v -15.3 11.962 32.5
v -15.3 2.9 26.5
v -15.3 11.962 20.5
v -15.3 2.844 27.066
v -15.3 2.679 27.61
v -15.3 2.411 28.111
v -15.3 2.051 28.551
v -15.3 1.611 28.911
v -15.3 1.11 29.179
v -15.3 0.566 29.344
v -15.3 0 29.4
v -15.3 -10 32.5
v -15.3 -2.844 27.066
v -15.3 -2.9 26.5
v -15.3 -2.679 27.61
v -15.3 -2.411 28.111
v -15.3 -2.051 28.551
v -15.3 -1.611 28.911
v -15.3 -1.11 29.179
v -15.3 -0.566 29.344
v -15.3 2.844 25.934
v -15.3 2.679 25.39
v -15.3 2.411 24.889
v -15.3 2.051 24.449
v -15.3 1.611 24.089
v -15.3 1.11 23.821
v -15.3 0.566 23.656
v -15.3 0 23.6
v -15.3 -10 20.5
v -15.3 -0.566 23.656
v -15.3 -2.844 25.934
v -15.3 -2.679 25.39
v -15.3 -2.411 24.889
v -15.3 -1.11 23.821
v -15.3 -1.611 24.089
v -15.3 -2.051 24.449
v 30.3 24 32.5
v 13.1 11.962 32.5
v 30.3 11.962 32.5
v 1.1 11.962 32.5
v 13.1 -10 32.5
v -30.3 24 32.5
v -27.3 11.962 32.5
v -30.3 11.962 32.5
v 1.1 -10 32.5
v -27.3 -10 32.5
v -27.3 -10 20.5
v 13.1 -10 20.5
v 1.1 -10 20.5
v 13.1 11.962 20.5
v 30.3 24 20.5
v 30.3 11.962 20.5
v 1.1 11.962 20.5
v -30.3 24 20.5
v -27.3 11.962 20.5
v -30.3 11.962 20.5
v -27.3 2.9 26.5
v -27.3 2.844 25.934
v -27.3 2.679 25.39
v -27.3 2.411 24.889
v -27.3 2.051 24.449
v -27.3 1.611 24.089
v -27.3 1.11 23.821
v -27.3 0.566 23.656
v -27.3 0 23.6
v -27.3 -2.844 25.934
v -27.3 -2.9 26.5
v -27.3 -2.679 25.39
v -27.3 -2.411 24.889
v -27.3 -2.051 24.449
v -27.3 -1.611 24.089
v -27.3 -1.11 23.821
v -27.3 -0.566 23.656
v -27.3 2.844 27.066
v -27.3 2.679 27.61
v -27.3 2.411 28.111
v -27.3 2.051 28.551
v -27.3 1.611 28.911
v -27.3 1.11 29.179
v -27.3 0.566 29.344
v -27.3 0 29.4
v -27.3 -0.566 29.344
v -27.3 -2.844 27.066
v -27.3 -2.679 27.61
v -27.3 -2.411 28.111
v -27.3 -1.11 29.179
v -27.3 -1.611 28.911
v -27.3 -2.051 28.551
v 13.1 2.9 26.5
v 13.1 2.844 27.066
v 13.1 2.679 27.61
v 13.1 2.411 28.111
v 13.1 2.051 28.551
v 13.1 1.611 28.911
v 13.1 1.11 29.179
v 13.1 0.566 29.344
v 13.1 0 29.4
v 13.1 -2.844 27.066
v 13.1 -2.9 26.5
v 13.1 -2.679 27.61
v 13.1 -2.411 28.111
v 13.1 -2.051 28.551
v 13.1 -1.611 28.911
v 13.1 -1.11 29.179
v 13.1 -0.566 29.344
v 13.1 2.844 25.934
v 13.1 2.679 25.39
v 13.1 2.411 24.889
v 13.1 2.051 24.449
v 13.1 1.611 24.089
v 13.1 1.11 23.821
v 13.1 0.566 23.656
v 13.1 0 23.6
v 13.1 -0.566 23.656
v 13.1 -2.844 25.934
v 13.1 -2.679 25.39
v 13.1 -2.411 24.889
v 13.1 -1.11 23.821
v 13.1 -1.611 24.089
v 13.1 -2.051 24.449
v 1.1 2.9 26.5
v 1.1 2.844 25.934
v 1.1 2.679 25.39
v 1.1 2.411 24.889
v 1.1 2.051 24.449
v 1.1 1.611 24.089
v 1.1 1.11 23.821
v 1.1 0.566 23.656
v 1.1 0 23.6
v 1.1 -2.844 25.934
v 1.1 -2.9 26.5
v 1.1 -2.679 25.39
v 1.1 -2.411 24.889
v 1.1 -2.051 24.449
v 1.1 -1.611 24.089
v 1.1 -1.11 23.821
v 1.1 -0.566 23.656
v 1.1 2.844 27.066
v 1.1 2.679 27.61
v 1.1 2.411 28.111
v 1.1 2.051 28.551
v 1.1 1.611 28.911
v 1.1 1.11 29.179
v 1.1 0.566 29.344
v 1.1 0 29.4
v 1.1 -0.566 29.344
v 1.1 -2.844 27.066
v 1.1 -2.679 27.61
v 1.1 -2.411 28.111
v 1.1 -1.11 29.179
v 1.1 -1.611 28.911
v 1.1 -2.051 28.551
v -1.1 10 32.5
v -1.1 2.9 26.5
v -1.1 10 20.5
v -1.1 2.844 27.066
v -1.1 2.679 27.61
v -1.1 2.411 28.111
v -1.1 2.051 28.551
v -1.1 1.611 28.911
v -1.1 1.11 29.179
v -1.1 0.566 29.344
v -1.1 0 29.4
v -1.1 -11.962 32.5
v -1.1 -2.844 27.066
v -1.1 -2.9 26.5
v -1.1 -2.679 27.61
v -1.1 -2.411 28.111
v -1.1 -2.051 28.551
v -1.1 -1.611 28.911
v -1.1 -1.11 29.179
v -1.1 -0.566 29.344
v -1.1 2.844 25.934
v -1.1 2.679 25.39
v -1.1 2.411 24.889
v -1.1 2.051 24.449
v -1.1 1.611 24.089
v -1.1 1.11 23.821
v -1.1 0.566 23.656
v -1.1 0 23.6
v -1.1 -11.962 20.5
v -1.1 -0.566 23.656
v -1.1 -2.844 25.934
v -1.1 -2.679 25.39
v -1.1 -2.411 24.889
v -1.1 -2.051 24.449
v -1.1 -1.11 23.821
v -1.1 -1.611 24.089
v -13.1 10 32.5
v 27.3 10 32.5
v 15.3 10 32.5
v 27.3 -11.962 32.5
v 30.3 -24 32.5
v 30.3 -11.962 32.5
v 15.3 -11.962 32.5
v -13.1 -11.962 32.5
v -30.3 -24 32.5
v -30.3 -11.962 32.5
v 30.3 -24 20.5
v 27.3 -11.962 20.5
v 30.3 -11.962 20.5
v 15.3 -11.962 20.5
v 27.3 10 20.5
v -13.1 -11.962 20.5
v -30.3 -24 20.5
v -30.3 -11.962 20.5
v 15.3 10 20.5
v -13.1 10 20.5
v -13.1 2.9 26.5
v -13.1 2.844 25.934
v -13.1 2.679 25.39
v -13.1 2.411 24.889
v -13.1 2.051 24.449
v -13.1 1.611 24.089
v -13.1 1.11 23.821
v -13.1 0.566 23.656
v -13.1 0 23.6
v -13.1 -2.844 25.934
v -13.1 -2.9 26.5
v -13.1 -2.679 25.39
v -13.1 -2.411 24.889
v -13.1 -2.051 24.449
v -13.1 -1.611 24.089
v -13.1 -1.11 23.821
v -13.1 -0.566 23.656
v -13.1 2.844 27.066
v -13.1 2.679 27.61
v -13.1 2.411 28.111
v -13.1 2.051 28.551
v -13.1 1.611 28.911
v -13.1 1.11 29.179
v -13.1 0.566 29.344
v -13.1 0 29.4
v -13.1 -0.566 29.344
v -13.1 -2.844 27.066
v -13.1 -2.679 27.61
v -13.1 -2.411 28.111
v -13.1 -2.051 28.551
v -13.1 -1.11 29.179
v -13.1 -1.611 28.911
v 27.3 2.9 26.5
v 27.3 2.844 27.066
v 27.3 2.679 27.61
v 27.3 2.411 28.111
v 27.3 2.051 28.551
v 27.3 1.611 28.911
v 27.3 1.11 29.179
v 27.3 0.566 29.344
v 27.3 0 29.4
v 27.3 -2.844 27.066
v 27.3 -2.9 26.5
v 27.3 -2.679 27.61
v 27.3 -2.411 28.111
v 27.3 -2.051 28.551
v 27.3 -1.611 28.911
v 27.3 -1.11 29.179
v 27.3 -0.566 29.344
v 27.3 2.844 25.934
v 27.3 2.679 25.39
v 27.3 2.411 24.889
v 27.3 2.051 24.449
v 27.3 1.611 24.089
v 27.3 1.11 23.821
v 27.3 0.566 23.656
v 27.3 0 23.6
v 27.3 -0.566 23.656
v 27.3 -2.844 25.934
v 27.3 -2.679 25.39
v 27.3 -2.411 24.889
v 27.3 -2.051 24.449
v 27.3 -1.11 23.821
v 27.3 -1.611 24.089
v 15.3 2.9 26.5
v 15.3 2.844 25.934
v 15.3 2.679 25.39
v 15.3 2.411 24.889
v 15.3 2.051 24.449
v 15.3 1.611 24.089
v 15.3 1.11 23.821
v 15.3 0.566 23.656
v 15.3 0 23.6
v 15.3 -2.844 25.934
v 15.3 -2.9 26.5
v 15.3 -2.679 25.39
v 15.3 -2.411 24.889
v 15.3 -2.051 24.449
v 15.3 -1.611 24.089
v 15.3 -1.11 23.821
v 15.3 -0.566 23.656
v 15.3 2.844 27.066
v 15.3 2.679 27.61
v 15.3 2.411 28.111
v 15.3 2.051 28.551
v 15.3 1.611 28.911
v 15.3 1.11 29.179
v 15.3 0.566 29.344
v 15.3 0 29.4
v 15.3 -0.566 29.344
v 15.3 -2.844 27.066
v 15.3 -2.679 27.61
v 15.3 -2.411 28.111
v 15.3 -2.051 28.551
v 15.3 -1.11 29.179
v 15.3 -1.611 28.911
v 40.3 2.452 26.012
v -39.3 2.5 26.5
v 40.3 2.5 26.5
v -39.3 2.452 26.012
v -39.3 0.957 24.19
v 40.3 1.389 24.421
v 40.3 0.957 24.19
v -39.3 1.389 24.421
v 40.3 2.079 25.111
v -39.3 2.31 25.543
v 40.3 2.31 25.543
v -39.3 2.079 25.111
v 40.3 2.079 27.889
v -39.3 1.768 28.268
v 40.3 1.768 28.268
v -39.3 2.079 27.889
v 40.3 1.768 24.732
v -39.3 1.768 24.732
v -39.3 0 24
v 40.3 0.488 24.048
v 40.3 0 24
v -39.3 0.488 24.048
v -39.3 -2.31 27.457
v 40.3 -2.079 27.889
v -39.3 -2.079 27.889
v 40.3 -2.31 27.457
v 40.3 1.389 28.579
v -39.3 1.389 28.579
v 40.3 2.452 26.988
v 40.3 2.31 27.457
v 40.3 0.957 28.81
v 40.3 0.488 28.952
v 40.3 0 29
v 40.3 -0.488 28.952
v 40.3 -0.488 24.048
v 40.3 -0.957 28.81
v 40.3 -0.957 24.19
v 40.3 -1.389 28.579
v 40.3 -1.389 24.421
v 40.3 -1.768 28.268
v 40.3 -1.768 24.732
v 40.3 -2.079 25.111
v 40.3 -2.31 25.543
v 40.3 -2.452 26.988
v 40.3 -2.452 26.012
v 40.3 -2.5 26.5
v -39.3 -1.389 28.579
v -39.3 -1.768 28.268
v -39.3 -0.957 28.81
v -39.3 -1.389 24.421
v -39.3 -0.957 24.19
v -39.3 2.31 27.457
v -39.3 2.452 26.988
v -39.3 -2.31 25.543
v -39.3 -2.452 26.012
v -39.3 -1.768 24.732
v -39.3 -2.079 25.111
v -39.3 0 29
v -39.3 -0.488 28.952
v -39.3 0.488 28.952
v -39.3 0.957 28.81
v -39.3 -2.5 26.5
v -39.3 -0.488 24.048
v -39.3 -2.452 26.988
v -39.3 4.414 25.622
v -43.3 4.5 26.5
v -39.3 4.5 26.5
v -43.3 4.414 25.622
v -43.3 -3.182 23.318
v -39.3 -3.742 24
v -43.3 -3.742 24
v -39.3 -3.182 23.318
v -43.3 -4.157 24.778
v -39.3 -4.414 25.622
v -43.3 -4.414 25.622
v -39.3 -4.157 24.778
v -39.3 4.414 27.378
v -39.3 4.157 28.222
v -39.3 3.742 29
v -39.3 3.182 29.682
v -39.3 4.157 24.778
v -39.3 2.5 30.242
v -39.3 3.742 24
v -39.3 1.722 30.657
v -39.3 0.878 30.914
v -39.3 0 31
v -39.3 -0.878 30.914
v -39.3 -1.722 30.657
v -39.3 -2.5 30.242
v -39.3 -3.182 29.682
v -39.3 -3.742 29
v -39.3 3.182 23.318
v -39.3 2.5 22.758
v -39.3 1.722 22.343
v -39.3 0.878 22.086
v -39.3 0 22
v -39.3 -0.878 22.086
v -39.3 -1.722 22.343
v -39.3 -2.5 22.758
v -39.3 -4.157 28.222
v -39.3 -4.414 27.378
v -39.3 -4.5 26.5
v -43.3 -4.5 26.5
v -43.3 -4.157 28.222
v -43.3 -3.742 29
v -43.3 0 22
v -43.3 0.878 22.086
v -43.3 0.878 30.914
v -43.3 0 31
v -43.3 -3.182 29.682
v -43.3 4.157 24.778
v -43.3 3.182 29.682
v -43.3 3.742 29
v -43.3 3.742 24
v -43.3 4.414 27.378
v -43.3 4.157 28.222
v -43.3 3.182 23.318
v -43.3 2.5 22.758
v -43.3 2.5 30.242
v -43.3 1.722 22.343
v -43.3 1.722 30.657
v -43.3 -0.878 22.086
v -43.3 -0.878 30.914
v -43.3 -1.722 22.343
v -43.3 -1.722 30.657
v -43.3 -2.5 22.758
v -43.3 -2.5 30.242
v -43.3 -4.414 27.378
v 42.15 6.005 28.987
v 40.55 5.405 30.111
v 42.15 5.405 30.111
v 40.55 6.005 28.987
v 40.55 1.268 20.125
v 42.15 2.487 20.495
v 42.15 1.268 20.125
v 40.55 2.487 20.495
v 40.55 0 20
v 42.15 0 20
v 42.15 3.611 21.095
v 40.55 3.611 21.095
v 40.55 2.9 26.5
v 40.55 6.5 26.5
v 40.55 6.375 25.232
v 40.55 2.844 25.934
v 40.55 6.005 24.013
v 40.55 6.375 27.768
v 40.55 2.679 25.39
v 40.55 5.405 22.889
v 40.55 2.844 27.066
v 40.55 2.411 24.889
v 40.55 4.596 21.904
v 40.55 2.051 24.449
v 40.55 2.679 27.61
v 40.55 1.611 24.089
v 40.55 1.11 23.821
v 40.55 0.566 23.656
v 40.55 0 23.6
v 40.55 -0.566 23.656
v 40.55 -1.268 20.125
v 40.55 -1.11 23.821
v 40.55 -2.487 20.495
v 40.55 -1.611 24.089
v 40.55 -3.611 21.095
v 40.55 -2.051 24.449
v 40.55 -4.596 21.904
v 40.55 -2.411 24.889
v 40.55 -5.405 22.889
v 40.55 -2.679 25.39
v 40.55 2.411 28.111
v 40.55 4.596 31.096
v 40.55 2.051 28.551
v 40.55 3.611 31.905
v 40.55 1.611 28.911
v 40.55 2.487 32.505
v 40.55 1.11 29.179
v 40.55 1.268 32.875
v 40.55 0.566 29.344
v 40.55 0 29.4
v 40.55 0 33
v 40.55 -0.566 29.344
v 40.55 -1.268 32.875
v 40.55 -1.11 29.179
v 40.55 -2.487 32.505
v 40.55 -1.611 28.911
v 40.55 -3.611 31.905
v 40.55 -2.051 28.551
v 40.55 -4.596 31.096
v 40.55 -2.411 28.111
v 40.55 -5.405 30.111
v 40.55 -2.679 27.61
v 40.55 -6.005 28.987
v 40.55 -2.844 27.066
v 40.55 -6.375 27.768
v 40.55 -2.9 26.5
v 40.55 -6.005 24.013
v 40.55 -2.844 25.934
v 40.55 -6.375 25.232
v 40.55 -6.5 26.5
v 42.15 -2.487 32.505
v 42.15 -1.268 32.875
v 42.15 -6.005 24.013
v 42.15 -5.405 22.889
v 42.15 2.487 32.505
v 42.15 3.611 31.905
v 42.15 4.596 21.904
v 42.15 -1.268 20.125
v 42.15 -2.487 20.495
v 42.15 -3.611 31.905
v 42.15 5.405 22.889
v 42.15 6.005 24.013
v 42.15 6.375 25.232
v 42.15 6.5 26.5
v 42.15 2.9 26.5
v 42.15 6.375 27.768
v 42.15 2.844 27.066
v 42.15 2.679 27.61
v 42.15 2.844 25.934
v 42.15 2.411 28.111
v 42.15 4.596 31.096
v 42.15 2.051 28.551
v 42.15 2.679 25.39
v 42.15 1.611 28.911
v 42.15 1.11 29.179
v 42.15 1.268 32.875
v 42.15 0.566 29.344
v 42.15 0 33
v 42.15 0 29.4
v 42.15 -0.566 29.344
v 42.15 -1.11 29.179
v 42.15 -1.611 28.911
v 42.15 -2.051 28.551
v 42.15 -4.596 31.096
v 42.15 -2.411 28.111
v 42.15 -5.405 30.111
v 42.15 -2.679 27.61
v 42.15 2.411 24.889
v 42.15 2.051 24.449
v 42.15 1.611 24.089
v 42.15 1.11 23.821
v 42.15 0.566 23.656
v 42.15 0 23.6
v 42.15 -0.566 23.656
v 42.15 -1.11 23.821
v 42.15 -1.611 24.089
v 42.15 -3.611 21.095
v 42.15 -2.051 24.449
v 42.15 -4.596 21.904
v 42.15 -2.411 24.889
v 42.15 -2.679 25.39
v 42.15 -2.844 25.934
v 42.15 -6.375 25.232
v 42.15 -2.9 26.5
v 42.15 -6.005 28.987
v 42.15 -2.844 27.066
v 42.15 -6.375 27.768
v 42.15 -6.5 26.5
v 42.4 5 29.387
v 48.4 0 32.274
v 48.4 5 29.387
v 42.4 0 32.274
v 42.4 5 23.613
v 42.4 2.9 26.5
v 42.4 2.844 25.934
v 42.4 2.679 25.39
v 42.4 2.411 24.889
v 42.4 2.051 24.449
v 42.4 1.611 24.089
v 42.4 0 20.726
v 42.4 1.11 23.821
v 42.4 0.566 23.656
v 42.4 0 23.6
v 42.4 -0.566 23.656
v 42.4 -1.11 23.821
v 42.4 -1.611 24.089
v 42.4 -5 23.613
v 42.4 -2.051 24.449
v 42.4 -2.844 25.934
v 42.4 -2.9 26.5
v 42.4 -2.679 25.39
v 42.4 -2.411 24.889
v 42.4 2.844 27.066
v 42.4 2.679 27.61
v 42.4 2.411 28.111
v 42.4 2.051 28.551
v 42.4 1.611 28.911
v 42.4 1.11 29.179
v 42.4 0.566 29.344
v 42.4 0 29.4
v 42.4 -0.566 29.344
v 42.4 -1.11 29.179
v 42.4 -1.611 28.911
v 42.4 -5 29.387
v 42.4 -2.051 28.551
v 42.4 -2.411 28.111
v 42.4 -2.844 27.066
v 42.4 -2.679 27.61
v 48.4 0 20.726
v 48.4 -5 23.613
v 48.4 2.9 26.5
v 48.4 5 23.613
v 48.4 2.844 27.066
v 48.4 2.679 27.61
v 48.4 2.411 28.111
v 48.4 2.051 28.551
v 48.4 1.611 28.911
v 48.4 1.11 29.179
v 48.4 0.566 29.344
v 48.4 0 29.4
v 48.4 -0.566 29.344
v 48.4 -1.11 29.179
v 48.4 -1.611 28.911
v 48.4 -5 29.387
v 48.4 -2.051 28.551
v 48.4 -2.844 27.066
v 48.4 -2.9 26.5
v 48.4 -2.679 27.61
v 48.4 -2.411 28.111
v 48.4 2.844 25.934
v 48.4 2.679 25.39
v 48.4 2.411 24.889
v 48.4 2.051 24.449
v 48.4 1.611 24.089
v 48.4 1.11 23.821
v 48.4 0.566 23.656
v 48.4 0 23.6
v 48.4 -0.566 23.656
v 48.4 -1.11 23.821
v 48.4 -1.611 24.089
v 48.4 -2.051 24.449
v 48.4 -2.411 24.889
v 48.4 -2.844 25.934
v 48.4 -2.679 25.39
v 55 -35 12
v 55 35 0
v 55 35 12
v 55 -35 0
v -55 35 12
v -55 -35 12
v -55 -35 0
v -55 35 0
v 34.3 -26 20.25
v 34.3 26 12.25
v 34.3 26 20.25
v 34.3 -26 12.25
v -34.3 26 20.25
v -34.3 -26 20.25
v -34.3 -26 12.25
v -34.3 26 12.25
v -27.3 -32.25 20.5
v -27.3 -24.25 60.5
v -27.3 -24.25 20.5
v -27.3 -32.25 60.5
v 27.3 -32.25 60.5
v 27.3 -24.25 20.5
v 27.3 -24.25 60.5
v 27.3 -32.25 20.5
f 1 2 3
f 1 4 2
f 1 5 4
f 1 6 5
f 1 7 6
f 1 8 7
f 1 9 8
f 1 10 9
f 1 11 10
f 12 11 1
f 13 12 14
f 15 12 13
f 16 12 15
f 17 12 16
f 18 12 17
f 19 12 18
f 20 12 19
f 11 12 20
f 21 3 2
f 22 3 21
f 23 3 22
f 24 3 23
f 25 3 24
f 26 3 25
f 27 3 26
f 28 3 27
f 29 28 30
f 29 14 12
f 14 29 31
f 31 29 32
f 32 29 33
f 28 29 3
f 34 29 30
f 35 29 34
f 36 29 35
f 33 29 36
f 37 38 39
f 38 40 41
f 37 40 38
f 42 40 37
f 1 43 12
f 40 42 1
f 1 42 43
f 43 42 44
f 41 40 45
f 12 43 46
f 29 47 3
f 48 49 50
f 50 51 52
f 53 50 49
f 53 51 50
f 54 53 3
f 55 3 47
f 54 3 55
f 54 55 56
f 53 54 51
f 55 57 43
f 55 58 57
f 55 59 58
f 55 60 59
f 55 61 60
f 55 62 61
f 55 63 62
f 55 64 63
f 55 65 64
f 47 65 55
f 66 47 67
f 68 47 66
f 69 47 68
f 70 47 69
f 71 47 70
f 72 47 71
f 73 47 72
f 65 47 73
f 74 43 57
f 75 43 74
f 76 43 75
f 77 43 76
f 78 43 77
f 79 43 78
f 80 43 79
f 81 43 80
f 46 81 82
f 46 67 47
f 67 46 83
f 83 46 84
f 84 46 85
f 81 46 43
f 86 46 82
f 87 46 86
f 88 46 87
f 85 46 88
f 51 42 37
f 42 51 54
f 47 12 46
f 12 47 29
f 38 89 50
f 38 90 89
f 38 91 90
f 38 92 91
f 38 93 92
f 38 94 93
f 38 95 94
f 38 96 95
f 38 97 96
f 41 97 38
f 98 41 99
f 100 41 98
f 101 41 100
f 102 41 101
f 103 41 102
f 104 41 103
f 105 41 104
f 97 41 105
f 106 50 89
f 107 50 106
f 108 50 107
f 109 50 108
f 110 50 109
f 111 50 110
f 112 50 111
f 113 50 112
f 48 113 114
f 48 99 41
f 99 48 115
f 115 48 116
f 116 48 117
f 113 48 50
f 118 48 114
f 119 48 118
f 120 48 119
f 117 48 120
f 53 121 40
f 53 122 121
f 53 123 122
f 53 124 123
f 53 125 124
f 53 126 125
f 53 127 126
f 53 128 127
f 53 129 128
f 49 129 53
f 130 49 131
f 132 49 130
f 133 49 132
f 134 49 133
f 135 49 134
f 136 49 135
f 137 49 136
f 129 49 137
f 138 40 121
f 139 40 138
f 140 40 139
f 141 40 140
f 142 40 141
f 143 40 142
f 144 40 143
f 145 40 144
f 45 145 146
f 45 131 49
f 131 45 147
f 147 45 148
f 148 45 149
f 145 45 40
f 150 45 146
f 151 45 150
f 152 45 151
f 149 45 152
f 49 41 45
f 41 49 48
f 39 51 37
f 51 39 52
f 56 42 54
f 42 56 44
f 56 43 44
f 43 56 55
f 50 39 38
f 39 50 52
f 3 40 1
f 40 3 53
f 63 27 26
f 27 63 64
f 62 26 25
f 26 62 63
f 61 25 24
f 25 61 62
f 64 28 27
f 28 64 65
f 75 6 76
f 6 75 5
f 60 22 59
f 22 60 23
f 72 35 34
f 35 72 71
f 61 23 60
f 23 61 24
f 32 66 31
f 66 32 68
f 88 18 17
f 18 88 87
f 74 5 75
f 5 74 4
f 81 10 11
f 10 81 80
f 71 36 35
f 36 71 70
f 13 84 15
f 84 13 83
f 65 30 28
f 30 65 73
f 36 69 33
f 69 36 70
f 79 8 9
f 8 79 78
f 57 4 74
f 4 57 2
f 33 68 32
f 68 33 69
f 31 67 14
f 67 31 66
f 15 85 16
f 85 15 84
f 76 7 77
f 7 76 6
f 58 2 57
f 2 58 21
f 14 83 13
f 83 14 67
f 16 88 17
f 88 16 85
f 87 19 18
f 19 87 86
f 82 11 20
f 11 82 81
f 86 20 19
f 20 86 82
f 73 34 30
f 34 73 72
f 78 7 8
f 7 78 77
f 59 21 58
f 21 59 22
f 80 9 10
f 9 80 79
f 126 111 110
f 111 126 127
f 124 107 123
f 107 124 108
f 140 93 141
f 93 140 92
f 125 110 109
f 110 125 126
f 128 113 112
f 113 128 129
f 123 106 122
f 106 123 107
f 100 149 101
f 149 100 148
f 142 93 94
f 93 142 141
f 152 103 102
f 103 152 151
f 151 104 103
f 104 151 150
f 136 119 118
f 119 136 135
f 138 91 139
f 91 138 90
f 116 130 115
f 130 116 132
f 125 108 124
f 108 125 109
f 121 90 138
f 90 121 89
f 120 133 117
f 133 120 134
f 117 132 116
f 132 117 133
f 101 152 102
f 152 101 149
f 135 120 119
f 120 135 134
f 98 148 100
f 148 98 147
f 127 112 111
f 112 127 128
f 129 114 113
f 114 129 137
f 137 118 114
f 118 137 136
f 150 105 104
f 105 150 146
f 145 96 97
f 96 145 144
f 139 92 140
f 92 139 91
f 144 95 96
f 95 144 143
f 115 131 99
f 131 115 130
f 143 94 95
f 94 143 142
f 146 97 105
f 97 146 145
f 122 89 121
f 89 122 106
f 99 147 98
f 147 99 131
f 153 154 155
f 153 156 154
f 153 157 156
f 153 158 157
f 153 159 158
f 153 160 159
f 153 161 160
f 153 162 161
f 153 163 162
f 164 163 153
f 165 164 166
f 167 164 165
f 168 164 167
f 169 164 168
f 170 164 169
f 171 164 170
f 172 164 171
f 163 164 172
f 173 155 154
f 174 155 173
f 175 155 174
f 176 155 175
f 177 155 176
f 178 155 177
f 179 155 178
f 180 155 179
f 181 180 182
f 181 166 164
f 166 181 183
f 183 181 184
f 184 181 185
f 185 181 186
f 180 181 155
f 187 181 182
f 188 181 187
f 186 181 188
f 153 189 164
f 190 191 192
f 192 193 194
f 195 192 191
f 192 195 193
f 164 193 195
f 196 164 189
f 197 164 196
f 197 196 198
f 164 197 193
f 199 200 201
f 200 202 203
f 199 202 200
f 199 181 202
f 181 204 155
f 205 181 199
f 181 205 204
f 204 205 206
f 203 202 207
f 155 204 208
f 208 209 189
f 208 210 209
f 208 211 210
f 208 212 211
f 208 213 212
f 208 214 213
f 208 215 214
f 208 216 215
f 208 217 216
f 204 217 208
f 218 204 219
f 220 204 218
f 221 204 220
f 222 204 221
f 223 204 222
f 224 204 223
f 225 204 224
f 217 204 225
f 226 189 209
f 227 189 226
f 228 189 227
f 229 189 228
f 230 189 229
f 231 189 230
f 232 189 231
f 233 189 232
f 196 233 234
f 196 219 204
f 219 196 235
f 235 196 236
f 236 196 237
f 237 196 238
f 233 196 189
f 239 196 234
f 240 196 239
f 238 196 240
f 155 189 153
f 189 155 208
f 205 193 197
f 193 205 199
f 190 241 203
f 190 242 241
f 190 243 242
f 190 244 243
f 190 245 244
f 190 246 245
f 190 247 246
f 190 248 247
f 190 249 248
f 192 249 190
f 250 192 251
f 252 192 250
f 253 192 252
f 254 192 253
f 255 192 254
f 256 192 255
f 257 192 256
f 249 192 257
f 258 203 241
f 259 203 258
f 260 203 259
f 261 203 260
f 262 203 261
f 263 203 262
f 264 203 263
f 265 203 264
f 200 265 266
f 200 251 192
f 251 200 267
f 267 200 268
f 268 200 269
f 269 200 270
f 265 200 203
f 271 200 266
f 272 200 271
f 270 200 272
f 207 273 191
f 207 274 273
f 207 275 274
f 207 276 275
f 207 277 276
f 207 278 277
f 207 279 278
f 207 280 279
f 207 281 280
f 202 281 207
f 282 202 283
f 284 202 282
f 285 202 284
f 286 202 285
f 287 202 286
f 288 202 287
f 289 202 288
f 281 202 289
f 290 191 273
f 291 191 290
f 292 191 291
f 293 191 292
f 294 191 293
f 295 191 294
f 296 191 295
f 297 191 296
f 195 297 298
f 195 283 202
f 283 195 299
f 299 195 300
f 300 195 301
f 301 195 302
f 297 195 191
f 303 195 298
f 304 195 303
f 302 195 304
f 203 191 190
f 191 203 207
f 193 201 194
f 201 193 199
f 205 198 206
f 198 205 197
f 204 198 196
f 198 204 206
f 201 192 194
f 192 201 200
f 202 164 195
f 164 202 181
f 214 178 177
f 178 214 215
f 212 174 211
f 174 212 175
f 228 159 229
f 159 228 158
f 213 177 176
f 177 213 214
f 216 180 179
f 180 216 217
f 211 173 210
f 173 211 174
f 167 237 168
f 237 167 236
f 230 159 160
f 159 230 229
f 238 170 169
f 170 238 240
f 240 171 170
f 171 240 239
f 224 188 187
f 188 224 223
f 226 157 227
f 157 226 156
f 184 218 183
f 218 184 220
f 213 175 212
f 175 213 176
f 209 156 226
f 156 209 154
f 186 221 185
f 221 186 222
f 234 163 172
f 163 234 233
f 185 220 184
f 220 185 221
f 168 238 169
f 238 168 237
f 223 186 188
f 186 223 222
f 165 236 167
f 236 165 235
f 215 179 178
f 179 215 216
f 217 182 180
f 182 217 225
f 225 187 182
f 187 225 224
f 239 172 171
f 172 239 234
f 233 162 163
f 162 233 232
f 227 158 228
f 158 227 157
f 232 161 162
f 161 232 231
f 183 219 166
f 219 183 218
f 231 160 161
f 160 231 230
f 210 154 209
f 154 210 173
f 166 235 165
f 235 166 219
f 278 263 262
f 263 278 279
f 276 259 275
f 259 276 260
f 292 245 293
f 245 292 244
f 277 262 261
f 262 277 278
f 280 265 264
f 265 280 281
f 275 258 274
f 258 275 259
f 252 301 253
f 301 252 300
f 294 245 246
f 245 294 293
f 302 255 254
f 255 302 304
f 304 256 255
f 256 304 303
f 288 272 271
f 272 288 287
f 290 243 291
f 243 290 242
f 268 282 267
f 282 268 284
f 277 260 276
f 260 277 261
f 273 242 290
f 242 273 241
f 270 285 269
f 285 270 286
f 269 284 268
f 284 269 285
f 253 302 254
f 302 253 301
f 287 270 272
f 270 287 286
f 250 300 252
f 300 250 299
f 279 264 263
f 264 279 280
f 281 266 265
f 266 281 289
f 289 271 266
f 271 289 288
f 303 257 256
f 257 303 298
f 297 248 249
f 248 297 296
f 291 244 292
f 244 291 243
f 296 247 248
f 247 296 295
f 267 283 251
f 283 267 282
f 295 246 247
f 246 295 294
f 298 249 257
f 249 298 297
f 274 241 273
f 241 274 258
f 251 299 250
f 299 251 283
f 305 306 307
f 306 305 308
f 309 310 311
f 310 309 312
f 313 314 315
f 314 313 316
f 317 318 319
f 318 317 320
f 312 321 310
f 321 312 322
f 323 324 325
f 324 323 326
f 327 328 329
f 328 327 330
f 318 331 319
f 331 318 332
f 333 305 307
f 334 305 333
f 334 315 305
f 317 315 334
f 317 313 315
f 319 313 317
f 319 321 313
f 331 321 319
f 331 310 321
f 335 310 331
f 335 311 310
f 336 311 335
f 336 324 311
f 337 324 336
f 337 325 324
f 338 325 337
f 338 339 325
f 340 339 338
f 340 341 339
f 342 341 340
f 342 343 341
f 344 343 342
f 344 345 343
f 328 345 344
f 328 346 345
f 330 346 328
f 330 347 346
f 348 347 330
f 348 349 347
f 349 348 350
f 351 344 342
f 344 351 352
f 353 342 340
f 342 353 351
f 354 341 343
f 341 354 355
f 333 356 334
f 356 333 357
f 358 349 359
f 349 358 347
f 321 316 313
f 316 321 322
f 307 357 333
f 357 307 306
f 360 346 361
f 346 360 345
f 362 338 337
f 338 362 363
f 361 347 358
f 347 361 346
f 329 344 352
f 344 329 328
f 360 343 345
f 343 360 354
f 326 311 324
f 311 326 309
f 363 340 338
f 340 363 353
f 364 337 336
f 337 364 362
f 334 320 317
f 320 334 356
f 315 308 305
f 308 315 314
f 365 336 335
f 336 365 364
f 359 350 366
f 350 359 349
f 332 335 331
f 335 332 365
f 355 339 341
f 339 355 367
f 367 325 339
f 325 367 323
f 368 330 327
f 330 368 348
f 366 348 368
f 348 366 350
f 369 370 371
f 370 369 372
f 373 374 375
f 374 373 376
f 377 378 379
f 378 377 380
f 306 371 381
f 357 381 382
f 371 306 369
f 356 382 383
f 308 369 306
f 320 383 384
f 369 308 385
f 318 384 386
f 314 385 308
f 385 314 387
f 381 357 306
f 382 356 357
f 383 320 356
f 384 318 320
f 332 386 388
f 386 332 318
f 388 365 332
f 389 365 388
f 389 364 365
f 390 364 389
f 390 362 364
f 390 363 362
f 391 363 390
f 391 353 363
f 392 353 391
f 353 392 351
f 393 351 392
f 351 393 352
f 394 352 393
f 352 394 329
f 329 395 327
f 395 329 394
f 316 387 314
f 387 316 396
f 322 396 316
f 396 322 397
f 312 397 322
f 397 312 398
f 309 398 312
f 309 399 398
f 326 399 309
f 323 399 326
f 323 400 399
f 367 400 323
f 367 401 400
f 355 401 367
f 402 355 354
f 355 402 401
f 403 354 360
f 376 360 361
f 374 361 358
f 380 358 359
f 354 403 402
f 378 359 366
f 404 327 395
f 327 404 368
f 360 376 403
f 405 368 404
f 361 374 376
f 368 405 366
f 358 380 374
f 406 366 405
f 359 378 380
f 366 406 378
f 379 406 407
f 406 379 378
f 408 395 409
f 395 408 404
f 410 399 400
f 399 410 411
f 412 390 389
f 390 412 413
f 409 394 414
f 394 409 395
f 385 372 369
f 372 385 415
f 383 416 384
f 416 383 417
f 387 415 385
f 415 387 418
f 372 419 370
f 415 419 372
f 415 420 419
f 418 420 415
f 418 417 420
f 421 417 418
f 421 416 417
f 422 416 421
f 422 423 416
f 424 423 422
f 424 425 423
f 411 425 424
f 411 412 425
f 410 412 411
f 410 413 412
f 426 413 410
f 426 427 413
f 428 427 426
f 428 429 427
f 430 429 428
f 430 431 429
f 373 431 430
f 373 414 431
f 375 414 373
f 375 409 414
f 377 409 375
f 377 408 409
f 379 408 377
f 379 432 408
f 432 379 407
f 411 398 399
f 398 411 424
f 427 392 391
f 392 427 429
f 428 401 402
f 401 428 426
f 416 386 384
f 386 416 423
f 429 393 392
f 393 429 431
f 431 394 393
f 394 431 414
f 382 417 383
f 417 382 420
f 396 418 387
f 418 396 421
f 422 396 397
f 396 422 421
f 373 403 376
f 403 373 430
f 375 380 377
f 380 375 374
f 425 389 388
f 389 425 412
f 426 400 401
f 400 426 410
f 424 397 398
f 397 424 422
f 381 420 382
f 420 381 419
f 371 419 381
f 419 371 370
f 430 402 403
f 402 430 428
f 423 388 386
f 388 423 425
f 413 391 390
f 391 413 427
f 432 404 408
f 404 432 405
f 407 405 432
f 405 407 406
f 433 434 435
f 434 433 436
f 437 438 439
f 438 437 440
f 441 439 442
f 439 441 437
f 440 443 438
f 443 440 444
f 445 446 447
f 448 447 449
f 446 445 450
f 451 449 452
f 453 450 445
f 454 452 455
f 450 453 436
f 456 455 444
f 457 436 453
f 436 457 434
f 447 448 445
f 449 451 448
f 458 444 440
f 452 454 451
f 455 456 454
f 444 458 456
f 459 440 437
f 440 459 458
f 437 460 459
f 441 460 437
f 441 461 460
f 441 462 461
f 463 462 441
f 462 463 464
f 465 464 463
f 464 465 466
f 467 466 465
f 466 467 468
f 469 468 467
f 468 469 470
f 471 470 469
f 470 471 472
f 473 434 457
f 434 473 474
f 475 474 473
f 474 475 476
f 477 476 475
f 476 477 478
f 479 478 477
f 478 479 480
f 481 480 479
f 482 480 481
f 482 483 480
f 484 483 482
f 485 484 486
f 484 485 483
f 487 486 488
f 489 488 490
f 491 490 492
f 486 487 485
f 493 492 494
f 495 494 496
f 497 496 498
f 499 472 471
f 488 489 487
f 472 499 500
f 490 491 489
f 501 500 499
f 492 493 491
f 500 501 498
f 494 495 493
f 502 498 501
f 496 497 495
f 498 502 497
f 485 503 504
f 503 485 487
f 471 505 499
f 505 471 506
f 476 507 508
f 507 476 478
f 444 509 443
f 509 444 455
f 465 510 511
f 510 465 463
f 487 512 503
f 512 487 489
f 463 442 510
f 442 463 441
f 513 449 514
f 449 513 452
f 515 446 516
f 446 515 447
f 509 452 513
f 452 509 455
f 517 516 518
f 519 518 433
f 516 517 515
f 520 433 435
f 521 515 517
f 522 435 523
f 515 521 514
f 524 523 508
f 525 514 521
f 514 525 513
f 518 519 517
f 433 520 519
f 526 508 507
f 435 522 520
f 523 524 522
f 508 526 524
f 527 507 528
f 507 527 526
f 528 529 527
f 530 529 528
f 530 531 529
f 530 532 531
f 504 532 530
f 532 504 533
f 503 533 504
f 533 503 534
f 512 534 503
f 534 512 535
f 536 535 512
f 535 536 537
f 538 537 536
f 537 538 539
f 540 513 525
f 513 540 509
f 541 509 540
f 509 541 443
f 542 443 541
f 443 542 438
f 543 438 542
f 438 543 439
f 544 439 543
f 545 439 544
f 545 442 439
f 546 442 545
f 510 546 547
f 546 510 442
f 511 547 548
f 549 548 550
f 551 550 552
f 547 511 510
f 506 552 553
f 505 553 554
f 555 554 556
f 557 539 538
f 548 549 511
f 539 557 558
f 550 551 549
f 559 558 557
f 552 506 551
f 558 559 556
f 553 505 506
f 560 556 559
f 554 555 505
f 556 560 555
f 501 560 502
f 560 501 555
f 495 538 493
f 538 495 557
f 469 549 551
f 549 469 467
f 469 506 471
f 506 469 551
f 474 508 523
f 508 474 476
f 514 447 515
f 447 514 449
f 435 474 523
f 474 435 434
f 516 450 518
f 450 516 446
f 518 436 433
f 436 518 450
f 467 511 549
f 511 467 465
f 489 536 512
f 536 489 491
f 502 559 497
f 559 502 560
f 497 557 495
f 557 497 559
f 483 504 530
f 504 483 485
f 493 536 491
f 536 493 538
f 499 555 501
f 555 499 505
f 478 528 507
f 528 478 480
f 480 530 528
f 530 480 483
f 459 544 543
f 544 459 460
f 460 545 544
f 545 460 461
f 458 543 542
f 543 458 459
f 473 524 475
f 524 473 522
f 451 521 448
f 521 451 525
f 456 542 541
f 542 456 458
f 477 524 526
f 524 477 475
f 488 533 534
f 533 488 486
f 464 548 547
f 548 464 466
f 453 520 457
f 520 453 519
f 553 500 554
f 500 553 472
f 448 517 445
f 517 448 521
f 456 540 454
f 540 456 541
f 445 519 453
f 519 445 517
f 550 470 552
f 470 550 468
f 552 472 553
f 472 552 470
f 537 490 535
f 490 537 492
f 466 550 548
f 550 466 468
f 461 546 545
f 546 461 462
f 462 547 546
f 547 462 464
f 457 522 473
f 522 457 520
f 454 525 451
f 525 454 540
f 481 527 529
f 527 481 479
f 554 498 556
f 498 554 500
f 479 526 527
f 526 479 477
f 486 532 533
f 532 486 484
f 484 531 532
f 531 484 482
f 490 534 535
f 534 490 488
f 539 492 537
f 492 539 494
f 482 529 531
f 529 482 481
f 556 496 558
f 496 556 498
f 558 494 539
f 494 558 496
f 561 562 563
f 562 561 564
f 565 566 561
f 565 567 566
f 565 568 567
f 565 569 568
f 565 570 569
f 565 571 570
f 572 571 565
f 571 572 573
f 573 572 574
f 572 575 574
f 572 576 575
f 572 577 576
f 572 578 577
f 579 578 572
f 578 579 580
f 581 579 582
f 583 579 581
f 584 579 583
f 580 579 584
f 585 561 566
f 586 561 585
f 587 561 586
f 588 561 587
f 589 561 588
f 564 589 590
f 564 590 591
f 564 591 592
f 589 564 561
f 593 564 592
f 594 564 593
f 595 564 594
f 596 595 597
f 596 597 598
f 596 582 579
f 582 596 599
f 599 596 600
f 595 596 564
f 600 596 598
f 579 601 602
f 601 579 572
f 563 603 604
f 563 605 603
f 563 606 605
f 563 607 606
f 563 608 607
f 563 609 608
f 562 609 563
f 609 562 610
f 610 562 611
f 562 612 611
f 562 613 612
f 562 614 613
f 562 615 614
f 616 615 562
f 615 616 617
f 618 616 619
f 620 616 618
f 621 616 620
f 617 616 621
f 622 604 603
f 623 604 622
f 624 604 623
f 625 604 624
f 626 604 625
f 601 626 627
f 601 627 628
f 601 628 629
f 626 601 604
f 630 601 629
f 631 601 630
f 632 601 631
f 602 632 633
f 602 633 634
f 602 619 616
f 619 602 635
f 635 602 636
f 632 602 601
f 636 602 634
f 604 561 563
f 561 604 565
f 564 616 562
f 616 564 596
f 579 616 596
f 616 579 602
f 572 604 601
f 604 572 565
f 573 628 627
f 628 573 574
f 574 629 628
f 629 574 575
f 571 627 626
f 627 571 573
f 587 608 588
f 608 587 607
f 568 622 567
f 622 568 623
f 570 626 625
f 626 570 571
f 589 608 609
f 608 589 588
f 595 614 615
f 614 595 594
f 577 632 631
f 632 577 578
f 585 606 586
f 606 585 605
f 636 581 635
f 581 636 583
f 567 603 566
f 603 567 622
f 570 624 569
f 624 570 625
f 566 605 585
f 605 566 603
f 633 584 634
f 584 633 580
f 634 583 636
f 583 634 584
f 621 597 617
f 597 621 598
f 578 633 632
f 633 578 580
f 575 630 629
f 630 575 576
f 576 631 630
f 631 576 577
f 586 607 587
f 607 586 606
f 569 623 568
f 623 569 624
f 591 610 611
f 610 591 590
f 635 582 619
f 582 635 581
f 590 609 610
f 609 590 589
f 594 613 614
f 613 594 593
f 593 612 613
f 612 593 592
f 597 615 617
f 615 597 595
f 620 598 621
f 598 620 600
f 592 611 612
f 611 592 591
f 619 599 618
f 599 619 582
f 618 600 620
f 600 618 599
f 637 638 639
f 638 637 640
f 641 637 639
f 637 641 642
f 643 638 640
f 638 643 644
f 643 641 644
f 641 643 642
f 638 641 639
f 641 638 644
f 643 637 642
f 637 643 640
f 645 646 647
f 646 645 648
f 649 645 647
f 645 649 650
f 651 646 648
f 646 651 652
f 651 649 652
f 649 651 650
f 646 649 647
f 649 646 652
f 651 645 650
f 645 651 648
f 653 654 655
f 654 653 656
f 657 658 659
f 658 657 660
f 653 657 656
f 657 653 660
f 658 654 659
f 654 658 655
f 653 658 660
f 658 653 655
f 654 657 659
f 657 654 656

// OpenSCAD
$fn = 32;

// ------------------------------------------------------------------------
// Comb hinge with flap: leaf 60.6 x 24 mm, pin d5, flap 40 mm
// Every part is its own module, assembly() places every instance.
// ------------------------------------------------------------------------

// --- part 1 ---
module hinge_bed() {
  difference() {
    translate([-55, -35, 0]) cube([110, 70, 12]);
  }
}

// --- part 2 ---
module hinge_riser() {
  difference() {
    translate([-34.3, -26, 0]) cube([68.6, 52, 8]);
  }
}

// --- part 3 ---
module hinge_leaf_a() {
  difference() {
    union() {
      translate([-27.3, -10, -6]) cube([12, 34, 12]);
      translate([1.1, -10, -6]) cube([12, 34, 12]);
      translate([-30.3, 11.962, -6]) cube([60.6, 12.038, 12]);
    }
    translate([-21.3, 0, 0]) rotate([0, 90, 0]) cylinder(h = 14, d = 5.8, center = true);
    translate([7.1, 0, 0]) rotate([0, 90, 0]) cylinder(h = 14, d = 5.8, center = true);
  }
}

// --- part 4 ---
module hinge_leaf_b() {
  difference() {
    union() {
      translate([-13.1, -24, -6]) cube([12, 34, 12]);
      translate([15.3, -24, -6]) cube([12, 34, 12]);
      translate([-30.3, -24, -6]) cube([60.6, 12.038, 12]);
    }
    translate([-7.1, 0, 0]) rotate([0, 90, 0]) cylinder(h = 14, d = 5.8, center = true);
    translate([21.3, 0, 0]) rotate([0, 90, 0]) cylinder(h = 14, d = 5.8, center = true);
  }
}

// --- part 5 ---
module hinge_flap() {
  difference() {
    translate([-27.3, -20, 0]) cube([54.6, 40, 8]);
  }
}

// --- part 6 ---
module hinge_pin() {
  rotate([0, 90, 0]) cylinder(h = 80.6, d = 5, center = true);
  translate([-43.3, 0, 0]) rotate([0, 90, 0]) cylinder(h = 4, d = 9);
}

// --- part 7 ---
module pin_washer() {
  difference() {
      translate([0, 0, 0]) cylinder(h = 1.6, d = 13);
      translate([0, 0, -1]) cylinder(h = 3.6, d = 5.8);
    }
}

// --- part 8 ---
module pin_nut() {
  difference() {
    linear_extrude(height = 6) polygon(points = [[5.774, 0], [2.887, 5], [-2.887, 5], [-5.774, 0], [-2.887, -5], [2.887, -5]]);
    translate([0, 0, -1]) cylinder(h = 8, d = 5.8);
  }
}

// --- assembly ---
module assembly() {
  color([0.80, 0.24, 0.20]) translate([0, 0, 0]) rotate([0, 0, 0]) hinge_bed();
  color([0.20, 0.45, 0.75]) translate([0, 0, 12.25]) rotate([0, 0, 0]) hinge_riser();
  color([0.25, 0.62, 0.32]) translate([0, 0, 26.5]) rotate([0, 0, 0]) hinge_leaf_a();
  color([0.92, 0.70, 0.18]) translate([0, 0, 26.5]) rotate([0, 0, 0]) hinge_leaf_b();
  color([0.58, 0.35, 0.70]) translate([0, -24.25, 40.5]) rotate([90, 0, 0]) hinge_flap();
  color([0.16, 0.66, 0.66]) translate([0, 0, 26.5]) rotate([0, 0, 0]) hinge_pin();
  color([0.85, 0.48, 0.18]) translate([40.55, 0, 26.5]) rotate([0, 90, 0]) pin_washer();
  color([0.55, 0.60, 0.65]) translate([42.4, 0, 26.5]) rotate([0, 90, 0]) pin_nut();
}

assembly();
